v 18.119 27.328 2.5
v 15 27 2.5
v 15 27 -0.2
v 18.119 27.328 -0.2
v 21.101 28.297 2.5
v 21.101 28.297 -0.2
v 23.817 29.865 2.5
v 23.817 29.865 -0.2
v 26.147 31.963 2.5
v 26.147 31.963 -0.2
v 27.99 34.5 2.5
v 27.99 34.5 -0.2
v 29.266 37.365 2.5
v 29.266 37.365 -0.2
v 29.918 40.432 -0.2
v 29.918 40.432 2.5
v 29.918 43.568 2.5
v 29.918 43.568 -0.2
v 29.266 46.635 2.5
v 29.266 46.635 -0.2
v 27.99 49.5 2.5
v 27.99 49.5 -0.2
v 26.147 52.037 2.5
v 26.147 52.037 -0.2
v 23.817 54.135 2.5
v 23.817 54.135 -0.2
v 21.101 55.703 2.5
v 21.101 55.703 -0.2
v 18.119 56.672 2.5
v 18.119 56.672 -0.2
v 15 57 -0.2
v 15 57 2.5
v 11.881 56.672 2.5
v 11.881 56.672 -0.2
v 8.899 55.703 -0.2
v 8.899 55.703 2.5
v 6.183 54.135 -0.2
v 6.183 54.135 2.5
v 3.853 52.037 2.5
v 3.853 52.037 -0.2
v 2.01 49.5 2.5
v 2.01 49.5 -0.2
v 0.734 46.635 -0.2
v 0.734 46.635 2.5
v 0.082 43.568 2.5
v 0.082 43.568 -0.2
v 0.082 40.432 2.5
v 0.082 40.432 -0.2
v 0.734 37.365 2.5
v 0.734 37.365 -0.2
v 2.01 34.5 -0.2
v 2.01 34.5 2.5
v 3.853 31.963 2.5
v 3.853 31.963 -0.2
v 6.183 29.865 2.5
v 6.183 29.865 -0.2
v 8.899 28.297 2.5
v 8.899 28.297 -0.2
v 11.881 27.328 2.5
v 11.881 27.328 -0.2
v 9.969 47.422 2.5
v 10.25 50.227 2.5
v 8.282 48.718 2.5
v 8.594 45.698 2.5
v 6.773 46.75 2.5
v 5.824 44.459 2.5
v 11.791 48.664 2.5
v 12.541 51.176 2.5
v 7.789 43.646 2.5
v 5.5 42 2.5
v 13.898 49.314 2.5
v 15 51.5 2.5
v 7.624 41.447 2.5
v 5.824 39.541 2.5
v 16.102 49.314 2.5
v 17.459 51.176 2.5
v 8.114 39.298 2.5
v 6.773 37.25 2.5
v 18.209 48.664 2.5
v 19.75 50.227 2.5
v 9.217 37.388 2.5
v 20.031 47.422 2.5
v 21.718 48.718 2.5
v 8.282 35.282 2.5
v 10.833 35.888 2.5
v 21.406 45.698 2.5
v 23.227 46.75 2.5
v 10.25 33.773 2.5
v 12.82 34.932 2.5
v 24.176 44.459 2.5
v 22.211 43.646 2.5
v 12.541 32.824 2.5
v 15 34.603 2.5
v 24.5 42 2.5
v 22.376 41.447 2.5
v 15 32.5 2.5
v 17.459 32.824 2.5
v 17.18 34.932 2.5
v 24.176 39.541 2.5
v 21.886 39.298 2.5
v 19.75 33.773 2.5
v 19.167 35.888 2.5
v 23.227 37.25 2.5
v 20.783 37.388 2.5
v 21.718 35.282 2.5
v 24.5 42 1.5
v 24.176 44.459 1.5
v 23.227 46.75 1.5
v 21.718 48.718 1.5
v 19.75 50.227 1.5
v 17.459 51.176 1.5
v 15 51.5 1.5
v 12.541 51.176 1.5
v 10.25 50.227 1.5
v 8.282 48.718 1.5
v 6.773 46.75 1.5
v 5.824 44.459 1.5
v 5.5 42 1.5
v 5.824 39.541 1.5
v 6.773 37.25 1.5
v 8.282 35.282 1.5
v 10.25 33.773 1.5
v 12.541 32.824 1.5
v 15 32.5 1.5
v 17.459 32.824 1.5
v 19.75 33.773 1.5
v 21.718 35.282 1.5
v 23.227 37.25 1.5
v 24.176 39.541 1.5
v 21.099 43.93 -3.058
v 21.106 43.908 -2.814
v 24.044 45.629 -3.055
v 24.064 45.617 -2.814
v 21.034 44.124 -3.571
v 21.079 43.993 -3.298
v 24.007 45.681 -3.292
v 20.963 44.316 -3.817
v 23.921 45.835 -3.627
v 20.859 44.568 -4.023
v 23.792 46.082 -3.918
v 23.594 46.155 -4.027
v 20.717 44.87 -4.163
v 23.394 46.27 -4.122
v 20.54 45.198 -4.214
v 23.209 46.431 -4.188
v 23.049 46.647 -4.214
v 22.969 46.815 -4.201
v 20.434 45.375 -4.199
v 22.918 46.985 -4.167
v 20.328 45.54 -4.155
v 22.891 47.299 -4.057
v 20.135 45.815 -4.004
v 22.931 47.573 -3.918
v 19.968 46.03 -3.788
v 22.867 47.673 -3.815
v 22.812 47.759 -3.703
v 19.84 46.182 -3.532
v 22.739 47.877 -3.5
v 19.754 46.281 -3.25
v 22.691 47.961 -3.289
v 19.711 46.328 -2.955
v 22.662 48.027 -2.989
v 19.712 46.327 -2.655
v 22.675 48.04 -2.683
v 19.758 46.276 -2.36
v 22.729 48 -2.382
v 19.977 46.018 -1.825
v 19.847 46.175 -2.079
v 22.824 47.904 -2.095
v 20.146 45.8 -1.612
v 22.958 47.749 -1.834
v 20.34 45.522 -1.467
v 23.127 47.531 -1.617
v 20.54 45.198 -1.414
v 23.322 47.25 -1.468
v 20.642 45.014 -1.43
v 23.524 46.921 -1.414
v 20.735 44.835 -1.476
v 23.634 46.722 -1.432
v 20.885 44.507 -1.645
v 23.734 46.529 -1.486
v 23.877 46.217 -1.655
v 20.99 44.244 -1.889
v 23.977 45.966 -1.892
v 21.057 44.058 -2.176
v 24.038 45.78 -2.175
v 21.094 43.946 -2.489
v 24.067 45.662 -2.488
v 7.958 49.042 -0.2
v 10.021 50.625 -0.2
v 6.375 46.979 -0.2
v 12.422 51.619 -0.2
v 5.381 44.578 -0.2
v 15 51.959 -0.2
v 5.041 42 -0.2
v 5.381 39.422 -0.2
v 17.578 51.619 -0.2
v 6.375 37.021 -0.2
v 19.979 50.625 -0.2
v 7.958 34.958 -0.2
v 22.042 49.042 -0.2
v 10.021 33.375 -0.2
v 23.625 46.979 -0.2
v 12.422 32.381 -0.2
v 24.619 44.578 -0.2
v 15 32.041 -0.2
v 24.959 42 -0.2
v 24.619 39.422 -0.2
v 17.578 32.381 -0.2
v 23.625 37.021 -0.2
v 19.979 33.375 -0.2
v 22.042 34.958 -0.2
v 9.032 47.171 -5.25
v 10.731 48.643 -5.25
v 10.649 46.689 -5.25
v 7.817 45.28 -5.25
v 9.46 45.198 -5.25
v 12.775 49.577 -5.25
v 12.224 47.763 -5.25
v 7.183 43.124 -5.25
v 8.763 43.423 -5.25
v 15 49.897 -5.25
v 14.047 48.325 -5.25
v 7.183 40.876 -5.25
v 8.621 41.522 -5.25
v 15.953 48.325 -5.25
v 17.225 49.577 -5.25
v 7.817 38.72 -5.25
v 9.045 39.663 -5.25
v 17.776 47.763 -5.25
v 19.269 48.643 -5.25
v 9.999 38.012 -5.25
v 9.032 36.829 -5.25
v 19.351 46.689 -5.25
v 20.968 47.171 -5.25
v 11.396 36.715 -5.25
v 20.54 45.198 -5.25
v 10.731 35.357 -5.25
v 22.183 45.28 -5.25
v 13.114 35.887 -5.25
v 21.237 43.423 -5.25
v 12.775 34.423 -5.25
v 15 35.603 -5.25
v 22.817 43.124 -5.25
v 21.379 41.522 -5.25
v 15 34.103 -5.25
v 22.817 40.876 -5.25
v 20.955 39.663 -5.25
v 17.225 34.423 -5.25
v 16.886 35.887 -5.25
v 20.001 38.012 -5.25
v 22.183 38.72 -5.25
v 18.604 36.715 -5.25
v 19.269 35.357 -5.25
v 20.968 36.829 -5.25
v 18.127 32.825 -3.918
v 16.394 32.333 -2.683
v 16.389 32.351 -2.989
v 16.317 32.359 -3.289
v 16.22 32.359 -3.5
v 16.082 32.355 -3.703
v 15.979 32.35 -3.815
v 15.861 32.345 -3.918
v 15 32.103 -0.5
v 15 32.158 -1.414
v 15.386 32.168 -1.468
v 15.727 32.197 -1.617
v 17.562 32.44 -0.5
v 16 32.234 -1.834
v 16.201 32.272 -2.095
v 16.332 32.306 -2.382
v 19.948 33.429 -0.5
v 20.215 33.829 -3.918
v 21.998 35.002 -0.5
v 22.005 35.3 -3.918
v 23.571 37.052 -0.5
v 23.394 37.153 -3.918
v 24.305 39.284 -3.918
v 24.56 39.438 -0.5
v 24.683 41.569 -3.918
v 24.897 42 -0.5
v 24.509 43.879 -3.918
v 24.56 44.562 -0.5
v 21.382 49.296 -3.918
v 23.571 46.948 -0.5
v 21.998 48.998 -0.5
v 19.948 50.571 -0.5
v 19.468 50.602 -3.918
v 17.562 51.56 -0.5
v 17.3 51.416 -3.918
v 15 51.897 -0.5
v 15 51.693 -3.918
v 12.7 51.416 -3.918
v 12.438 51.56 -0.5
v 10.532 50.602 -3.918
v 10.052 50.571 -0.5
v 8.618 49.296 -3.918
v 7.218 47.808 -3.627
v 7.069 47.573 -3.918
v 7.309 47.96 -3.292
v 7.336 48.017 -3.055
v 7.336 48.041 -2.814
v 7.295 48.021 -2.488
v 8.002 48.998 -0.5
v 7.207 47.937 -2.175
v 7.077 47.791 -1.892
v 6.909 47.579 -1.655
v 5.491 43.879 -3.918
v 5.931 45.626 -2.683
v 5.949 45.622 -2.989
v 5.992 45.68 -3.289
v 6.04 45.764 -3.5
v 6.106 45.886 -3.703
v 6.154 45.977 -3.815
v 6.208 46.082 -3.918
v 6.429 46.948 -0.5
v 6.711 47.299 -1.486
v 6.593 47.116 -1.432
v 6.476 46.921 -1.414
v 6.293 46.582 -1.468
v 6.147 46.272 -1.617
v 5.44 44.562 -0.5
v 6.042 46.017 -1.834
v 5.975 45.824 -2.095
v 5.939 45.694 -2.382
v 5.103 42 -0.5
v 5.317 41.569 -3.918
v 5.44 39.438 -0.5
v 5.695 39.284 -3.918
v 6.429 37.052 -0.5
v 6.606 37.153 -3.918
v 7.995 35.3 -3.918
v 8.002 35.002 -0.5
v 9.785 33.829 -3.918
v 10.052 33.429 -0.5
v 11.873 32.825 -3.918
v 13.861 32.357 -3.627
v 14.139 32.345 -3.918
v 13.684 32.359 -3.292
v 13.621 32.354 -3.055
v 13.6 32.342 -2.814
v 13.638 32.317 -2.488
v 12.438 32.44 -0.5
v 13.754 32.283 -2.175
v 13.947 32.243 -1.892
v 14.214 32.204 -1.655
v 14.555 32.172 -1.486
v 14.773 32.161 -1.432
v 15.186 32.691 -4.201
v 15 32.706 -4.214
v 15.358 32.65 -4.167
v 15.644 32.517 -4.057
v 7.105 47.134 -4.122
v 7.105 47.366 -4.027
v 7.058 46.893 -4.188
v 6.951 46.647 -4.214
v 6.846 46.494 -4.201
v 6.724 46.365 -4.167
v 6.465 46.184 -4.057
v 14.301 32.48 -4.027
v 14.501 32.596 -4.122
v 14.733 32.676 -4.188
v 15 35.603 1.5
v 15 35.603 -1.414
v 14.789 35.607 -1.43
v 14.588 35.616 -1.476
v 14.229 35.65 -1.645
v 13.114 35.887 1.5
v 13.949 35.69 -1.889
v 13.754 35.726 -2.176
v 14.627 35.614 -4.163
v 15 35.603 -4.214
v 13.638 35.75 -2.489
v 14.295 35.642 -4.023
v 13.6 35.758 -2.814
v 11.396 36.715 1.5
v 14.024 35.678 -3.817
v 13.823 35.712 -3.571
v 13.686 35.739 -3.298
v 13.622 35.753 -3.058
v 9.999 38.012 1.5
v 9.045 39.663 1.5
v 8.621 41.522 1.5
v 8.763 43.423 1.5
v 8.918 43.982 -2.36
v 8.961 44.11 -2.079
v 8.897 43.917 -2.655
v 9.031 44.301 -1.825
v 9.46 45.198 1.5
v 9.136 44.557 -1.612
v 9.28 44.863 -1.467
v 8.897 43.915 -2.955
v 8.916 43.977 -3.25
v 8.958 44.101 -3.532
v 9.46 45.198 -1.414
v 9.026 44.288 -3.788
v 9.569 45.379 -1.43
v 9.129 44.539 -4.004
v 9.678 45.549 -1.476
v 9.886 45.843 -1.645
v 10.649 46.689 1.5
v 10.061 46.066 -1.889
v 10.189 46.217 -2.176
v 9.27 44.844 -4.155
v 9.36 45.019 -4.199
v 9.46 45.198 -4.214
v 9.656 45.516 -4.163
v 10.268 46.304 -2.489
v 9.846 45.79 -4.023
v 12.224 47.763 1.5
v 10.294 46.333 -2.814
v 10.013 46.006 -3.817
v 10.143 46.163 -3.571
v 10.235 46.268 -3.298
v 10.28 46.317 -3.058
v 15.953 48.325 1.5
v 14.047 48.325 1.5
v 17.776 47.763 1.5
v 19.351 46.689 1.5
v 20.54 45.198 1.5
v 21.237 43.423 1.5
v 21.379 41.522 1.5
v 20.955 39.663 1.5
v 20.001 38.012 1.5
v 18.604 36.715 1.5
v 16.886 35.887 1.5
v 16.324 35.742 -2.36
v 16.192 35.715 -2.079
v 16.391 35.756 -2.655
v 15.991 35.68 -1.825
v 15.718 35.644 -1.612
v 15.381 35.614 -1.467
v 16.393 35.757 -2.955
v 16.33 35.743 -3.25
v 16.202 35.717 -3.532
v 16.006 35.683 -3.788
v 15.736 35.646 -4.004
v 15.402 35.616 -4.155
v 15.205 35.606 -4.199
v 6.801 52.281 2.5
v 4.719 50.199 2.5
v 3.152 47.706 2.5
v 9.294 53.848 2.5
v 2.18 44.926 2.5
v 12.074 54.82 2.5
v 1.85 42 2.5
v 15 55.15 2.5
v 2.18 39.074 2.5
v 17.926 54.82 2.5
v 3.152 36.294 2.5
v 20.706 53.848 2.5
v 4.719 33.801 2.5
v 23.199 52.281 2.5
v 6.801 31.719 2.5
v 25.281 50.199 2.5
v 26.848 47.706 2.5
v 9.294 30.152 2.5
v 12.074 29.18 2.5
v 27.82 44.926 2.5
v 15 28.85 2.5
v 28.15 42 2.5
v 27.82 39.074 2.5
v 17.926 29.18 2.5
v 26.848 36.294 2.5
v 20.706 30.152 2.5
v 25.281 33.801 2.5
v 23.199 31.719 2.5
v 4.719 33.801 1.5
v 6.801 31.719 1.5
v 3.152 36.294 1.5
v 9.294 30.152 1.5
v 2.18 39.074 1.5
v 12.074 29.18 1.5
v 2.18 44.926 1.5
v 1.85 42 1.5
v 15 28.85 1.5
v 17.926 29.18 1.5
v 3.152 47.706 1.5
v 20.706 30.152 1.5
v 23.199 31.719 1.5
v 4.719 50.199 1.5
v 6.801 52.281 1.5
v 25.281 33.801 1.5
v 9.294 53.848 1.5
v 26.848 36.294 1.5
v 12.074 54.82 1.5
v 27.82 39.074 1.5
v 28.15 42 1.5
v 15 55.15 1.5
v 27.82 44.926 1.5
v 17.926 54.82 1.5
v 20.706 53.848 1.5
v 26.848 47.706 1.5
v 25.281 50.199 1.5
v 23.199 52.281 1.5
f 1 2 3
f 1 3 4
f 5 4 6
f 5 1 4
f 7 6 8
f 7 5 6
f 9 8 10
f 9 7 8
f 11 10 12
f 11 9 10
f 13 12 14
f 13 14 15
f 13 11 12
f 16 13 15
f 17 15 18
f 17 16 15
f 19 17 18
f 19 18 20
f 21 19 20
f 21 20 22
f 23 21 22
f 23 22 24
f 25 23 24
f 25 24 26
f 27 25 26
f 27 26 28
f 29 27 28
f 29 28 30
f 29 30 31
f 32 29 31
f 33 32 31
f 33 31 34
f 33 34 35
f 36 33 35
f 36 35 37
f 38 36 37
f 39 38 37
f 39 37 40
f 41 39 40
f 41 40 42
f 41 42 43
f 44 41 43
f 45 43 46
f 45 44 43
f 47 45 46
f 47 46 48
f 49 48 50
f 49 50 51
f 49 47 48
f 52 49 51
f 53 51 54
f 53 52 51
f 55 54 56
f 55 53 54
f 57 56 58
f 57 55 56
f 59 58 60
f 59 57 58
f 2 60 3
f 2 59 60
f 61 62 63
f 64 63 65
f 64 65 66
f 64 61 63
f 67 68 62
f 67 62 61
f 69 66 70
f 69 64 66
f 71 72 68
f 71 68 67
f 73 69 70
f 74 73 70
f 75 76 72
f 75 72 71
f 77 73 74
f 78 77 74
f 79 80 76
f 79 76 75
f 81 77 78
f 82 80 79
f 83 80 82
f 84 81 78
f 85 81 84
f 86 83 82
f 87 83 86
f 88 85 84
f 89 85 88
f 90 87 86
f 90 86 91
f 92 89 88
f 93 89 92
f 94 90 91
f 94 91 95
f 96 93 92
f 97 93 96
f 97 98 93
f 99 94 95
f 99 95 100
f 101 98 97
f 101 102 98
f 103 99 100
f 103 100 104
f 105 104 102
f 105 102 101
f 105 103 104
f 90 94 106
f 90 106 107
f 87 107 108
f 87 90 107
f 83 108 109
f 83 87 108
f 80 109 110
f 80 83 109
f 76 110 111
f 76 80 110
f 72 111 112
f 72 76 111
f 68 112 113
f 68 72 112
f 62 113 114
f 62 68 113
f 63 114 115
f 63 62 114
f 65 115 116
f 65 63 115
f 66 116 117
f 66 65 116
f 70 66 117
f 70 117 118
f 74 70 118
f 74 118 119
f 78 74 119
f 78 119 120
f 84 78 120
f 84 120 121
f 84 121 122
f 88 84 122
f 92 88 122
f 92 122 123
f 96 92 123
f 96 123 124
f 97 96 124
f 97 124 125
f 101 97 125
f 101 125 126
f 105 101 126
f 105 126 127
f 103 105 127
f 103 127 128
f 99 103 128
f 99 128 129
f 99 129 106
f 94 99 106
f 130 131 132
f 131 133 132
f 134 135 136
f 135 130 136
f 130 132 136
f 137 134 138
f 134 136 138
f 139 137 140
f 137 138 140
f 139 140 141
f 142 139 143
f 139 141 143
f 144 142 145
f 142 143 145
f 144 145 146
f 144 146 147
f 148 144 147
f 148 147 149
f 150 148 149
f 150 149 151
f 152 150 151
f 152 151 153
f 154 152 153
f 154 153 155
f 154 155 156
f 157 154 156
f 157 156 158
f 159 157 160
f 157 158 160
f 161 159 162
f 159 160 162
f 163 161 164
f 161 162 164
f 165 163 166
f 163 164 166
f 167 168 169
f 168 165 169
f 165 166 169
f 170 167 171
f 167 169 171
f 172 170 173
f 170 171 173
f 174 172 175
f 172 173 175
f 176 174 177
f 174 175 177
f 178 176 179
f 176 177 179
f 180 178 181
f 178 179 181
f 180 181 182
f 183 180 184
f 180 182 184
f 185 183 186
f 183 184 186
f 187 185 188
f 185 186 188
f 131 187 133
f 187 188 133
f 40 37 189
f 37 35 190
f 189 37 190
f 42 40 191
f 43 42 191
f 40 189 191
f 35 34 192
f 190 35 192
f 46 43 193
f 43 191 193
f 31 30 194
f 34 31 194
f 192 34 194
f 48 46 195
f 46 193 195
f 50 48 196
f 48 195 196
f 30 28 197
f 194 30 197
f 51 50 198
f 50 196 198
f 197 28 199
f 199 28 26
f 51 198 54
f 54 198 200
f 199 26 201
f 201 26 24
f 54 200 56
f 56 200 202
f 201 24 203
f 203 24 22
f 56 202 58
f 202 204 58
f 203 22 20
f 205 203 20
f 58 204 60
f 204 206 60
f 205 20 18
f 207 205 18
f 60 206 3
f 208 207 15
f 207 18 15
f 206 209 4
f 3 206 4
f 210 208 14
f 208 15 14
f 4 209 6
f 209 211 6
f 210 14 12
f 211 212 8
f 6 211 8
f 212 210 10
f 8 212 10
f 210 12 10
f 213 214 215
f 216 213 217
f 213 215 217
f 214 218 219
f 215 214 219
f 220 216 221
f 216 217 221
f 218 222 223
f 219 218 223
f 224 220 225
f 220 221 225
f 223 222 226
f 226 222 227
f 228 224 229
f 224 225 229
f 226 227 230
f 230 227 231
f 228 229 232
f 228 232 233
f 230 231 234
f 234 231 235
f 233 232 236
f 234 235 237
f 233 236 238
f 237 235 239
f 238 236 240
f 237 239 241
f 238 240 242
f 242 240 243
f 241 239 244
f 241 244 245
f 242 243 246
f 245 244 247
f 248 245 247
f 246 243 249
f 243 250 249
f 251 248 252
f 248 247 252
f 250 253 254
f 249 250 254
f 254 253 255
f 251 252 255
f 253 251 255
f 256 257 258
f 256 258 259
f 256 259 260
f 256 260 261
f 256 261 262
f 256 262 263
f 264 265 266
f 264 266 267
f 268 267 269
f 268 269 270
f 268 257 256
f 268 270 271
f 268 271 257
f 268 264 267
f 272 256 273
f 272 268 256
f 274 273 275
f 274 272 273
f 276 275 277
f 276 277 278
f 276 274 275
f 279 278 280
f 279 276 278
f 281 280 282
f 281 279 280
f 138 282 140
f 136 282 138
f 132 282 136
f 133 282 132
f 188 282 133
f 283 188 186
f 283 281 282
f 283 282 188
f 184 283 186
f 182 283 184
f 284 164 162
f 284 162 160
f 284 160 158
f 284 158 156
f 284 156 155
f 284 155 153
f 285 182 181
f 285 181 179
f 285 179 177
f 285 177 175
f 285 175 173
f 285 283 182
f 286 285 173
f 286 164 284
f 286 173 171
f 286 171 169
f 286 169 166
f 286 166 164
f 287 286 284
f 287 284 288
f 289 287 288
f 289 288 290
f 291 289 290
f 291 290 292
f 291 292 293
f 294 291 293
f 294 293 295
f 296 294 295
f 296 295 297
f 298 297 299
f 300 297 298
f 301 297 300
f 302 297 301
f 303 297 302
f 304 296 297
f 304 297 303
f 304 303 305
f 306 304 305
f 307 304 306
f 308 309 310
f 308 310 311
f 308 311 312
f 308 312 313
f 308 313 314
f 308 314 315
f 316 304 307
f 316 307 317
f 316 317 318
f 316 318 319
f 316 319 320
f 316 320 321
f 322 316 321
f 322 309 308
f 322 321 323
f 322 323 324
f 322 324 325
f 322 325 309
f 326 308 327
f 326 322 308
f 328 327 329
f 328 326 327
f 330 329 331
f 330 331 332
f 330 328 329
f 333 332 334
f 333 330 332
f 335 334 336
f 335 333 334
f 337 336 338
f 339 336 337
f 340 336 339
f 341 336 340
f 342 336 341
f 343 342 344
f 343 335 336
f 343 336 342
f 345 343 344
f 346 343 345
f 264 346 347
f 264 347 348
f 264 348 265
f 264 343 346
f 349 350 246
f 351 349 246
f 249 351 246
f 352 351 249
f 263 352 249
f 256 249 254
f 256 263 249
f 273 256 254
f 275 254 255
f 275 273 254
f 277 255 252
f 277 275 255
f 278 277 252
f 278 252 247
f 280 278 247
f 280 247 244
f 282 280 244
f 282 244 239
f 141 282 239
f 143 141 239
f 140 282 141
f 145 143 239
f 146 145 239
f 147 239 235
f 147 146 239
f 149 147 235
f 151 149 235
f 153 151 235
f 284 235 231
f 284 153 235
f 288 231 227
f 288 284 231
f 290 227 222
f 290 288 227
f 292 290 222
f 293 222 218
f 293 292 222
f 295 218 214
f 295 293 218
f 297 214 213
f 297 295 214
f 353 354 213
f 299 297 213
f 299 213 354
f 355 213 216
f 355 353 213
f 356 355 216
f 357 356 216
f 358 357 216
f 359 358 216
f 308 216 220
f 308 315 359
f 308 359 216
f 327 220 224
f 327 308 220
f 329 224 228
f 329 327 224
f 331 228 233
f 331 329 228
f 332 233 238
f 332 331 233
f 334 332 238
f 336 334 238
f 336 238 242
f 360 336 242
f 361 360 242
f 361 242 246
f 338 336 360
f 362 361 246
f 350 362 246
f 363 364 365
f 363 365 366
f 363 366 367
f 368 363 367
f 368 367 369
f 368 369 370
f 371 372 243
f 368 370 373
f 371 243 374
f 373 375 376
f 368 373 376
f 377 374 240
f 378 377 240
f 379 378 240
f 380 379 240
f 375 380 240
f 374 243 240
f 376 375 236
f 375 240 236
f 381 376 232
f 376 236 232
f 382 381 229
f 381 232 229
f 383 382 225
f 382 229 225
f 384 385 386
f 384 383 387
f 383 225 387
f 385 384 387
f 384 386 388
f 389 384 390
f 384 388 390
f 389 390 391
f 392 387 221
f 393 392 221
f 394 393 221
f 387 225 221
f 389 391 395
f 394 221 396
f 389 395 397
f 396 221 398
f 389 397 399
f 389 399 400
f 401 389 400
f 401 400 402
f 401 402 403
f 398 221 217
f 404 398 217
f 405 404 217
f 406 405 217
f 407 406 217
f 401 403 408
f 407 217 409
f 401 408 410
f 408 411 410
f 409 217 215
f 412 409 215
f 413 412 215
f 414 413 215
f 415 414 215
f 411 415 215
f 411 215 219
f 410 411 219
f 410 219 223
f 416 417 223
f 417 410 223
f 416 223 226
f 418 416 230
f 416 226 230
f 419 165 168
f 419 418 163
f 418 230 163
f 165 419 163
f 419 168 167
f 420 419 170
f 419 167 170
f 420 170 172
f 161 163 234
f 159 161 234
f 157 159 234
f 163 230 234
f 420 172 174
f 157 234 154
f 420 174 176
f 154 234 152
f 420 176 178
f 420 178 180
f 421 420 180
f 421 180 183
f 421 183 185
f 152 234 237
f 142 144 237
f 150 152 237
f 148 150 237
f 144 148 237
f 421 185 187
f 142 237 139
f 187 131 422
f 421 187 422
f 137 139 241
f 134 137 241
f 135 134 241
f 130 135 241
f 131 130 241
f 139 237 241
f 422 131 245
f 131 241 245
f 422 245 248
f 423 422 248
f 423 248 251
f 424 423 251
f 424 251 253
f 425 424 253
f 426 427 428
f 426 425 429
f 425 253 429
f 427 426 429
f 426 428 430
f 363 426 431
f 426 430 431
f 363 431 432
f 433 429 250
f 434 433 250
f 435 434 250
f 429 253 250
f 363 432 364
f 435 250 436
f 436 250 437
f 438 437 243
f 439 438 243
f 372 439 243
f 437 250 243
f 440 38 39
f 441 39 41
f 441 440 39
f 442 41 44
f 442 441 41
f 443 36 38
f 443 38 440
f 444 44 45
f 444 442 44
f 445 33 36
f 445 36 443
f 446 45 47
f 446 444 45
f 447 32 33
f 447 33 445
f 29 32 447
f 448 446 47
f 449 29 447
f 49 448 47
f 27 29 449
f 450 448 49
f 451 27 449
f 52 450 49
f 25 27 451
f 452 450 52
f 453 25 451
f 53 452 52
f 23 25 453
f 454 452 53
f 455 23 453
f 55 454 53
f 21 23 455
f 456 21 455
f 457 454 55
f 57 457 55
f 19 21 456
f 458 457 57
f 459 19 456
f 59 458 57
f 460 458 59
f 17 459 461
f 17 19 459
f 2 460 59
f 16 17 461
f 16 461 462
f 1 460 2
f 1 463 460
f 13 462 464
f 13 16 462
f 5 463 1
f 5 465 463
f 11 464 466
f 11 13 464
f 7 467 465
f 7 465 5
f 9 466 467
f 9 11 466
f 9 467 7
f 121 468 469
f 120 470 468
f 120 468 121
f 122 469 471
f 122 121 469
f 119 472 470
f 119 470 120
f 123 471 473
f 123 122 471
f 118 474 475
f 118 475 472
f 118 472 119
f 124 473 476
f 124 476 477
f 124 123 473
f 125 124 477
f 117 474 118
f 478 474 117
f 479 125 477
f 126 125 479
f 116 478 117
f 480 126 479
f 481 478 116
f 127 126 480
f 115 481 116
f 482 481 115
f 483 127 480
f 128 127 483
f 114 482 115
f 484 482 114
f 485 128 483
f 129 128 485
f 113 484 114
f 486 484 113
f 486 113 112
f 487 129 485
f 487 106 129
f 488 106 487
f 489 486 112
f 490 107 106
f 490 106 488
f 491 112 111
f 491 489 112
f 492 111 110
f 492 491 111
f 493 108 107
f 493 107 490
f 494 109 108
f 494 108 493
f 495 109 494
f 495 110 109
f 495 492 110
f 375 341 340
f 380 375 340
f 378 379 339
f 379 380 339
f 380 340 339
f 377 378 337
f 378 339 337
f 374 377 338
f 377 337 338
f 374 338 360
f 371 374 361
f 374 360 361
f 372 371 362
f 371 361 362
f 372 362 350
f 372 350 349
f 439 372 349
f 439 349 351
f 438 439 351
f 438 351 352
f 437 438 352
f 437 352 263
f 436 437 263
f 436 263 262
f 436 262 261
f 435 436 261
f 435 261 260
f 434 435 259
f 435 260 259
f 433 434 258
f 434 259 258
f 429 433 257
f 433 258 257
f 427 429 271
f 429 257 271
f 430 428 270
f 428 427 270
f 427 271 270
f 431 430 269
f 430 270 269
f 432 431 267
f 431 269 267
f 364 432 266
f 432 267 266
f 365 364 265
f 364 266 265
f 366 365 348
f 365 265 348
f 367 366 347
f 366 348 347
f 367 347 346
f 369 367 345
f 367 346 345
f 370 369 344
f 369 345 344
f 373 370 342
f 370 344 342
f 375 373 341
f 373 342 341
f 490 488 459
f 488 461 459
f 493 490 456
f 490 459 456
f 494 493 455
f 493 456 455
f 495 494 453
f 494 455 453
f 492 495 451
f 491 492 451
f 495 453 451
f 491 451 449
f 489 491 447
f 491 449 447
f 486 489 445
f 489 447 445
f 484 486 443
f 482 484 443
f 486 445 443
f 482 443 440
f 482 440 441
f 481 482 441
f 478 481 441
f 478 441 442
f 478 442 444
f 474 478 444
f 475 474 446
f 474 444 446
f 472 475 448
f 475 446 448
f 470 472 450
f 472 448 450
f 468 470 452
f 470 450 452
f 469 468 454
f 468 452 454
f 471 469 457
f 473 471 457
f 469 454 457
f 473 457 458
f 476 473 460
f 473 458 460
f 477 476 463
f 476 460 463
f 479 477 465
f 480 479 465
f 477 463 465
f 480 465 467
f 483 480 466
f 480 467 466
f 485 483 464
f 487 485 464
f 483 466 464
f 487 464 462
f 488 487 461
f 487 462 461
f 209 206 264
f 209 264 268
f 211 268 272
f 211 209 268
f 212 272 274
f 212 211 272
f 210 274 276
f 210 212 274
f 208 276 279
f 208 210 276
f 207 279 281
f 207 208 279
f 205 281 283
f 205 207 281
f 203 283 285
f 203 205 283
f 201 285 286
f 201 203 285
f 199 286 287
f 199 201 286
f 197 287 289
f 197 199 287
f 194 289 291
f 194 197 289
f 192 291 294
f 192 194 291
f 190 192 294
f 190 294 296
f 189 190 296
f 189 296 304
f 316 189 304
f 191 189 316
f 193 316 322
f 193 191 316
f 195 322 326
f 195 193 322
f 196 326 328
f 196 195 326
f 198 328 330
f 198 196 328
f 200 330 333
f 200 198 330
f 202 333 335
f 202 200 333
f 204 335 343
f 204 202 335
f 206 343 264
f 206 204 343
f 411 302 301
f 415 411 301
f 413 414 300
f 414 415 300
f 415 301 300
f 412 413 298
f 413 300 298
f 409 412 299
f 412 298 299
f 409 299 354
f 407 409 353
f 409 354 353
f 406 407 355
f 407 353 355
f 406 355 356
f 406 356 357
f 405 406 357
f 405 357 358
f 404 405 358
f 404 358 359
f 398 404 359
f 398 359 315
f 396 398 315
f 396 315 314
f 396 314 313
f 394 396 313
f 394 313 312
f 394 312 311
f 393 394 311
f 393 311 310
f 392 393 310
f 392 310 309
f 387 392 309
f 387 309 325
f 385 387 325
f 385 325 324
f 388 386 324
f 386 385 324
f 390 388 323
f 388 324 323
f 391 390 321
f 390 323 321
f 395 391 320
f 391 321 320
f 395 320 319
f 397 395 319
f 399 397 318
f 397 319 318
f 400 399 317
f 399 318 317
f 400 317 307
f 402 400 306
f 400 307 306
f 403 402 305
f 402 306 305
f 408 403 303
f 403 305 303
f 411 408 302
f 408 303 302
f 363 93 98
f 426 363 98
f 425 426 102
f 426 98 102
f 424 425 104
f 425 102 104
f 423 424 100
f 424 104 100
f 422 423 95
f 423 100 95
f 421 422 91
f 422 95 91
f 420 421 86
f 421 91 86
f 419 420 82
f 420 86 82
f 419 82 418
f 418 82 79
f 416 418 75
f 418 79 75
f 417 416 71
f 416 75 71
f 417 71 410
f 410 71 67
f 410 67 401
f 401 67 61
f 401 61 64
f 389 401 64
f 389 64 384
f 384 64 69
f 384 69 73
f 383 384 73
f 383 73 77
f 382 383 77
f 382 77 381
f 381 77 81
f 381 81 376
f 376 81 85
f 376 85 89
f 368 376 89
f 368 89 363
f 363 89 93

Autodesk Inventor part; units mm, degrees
ref_plane "YZ Plane" through (0, 0, 0) normal (1, 0, 0) x (0, 1, 0)
ref_plane "XZ Plane" through (0, 0, 0) normal (0, 1, 0) x (-1, 0, 0)
ref_plane "XY Plane" through (0, 0, 0) normal (0, 0, 1) x (1, 0, 0)
ref_plane "Arbeitsebene1" through (15, 0, 0) normal (-1, 0, 0) x (0, 1, 0)
sketch "Skizze1" plane through (15, 0, 0) normal (-1, 0, 0) x (0, 1, 0)
  line L0 (32.6031, 0.5) -> (30.7237, 0.5) projected
  line L1 (30.7237, 4.25) -> (32.6031, 4.25) projected
  line L2 (30.7237, 0.5) -> (30.7237, 4.25) projected
  line L3 (32.6031, 0.5) -> (30.7237, 0.5) projected
  line L4 (30.7237, 4.7) -> (32.6031, 4.7) projected
  line L5 (30.7237, 0.5) -> (30.7237, 4.25) projected
  line L6 (30, 0.5) -> (32, 0.5) projected
  line L7 (30, 0.55) -> (30, 0.5) projected
  line L8 (32, 0.5) -> (32, 0.55) projected
  line L9 (32, 0.5) -> (32, 16.1)
  line L10 (52, 0.5) -> (52, 16.1)
  line L11 (42, 19.32) -> (42, -3.22)
  line L12 (32.6031, 0.5) -> (27, 0.5)
  line L13 (27, 0.5) -> (27, -2.5)
  line L14 (27, -2.5) -> (35.6031, -2.5)
  line L15 (35.6031, -2.5) -> (35.6031, 5.25)
  line L16 (35.6031, 5.25) -> (34.1031, 5.25)
  line L17 (32.6031, 0.5) -> (32.6031, 0.2)
  line L18 (32.6031, 0.2) -> (27, 0.2)
  line L19 (32, 0.55) -> (30, 0.55) projected
  line L20 (32.1031, 0.5) -> (32.0412, 0.2)
  line L21 (27, -2.5) -> (32, -2.5)
  line L22 (32, -2.5) -> (32, -10.5)
  line L23 (32, -10.5) -> (27, -10.5)
  line L24 (27, -10.5) -> (27, -2.5)
  line L25 (34.1031, 5.25) -> (32.307, 3.9176)
  line L26 (32.307, 3.9176) -> (32.1031, 0.5)
  point P0 (0, 0)
  point P1 (32, -2.5)
  point P2 (30.7237, 0.55)
  point P3 (32, 4.25)
  dimension "d1" = 3
  dimension "d3" = 1
  dimension "d11" = 0.5
  dimension "d13" = 15
  dimension "d14" = 8
  dimension "d15" = 10
  dimension "d37" = 0.3
  dimension "d38" = 6.3969
revolve "Umdrehung1" add sketch "Skizze1" angle 360 about axis through (15, 42, -19.32) along (0, 0, 1) contours L17 L18 L20 L0 | L0 L26 L25 L16 L15 L14 L13 L18 L17
sketch "Skizze2" plane through (0, 0, 0) normal (0, 1, 0) x (-1, 0, 0)
  spline S0 degree 3 poles (-15, -4.25) (-12.1304, -4.4784) (-9.2732, -4.7067) (-7.1109, -4.9351) (-6.8554, -4.962) (-6.6095, -4.989) (-6.3738, -5.016) knots 0 0 0 0 0.7174 0.7174 0.7174 0.802142 0.802142 0.802142 0.802142 projected
  spline S1 degree 3 poles (-14.5016, -1.0897) (-11.6314, -1.3183) (-8.8183, -1.5469) (-6.7355, -1.7755) (-6.2054, -1.8336) (-5.7215, -1.8918) (-5.2918, -1.95) knots 0.041547 0.041547 0.041547 0.041547 0.759706 0.759706 0.759706 0.942478 0.942478 0.942478 0.942478 projected
  circle A0 centre (-15, -2.8138) radius 1.4
  line L0 (-15, 1.0048) -> (-15, -6.0288) projected
  point P0 (0, 0)
  dimension "d5" = 2.8
extrude "Extrusion1" cut sketch "Skizze2" along normal up to surface
pattern_circular "Runde Anordnung1" count 3 over 360 about axis through (15, 42, 1.15) along (0, 0, -1) of "Extrusion1"
chamfer "Fase1" distance 1 angle 45 1 edges at (15, 48.3969, 2.5)
sketch "Skizze6" plane through (15, 42, 2.5) normal (0, 0, 1) x (1, 0, 0)
  circle A0 centre (0, 0) radius 15 projected
  circle A1 centre (0, 0) radius 7.3969 projected
  circle A2 centre (0, 0) radius 13.15
  circle A3 centre (0, 0) radius 9.5
  point P0 (-15, -42)
  dimension "d31" = 26.3
  dimension "d39" = 19
extrude "Extrusion4" cut sketch "Skizze6" against normal blind 1 contours A2
properties part number "30_Linear_Stage_NEMA11_baseholder_bayonetmount_objective_rms_metaladapter"
